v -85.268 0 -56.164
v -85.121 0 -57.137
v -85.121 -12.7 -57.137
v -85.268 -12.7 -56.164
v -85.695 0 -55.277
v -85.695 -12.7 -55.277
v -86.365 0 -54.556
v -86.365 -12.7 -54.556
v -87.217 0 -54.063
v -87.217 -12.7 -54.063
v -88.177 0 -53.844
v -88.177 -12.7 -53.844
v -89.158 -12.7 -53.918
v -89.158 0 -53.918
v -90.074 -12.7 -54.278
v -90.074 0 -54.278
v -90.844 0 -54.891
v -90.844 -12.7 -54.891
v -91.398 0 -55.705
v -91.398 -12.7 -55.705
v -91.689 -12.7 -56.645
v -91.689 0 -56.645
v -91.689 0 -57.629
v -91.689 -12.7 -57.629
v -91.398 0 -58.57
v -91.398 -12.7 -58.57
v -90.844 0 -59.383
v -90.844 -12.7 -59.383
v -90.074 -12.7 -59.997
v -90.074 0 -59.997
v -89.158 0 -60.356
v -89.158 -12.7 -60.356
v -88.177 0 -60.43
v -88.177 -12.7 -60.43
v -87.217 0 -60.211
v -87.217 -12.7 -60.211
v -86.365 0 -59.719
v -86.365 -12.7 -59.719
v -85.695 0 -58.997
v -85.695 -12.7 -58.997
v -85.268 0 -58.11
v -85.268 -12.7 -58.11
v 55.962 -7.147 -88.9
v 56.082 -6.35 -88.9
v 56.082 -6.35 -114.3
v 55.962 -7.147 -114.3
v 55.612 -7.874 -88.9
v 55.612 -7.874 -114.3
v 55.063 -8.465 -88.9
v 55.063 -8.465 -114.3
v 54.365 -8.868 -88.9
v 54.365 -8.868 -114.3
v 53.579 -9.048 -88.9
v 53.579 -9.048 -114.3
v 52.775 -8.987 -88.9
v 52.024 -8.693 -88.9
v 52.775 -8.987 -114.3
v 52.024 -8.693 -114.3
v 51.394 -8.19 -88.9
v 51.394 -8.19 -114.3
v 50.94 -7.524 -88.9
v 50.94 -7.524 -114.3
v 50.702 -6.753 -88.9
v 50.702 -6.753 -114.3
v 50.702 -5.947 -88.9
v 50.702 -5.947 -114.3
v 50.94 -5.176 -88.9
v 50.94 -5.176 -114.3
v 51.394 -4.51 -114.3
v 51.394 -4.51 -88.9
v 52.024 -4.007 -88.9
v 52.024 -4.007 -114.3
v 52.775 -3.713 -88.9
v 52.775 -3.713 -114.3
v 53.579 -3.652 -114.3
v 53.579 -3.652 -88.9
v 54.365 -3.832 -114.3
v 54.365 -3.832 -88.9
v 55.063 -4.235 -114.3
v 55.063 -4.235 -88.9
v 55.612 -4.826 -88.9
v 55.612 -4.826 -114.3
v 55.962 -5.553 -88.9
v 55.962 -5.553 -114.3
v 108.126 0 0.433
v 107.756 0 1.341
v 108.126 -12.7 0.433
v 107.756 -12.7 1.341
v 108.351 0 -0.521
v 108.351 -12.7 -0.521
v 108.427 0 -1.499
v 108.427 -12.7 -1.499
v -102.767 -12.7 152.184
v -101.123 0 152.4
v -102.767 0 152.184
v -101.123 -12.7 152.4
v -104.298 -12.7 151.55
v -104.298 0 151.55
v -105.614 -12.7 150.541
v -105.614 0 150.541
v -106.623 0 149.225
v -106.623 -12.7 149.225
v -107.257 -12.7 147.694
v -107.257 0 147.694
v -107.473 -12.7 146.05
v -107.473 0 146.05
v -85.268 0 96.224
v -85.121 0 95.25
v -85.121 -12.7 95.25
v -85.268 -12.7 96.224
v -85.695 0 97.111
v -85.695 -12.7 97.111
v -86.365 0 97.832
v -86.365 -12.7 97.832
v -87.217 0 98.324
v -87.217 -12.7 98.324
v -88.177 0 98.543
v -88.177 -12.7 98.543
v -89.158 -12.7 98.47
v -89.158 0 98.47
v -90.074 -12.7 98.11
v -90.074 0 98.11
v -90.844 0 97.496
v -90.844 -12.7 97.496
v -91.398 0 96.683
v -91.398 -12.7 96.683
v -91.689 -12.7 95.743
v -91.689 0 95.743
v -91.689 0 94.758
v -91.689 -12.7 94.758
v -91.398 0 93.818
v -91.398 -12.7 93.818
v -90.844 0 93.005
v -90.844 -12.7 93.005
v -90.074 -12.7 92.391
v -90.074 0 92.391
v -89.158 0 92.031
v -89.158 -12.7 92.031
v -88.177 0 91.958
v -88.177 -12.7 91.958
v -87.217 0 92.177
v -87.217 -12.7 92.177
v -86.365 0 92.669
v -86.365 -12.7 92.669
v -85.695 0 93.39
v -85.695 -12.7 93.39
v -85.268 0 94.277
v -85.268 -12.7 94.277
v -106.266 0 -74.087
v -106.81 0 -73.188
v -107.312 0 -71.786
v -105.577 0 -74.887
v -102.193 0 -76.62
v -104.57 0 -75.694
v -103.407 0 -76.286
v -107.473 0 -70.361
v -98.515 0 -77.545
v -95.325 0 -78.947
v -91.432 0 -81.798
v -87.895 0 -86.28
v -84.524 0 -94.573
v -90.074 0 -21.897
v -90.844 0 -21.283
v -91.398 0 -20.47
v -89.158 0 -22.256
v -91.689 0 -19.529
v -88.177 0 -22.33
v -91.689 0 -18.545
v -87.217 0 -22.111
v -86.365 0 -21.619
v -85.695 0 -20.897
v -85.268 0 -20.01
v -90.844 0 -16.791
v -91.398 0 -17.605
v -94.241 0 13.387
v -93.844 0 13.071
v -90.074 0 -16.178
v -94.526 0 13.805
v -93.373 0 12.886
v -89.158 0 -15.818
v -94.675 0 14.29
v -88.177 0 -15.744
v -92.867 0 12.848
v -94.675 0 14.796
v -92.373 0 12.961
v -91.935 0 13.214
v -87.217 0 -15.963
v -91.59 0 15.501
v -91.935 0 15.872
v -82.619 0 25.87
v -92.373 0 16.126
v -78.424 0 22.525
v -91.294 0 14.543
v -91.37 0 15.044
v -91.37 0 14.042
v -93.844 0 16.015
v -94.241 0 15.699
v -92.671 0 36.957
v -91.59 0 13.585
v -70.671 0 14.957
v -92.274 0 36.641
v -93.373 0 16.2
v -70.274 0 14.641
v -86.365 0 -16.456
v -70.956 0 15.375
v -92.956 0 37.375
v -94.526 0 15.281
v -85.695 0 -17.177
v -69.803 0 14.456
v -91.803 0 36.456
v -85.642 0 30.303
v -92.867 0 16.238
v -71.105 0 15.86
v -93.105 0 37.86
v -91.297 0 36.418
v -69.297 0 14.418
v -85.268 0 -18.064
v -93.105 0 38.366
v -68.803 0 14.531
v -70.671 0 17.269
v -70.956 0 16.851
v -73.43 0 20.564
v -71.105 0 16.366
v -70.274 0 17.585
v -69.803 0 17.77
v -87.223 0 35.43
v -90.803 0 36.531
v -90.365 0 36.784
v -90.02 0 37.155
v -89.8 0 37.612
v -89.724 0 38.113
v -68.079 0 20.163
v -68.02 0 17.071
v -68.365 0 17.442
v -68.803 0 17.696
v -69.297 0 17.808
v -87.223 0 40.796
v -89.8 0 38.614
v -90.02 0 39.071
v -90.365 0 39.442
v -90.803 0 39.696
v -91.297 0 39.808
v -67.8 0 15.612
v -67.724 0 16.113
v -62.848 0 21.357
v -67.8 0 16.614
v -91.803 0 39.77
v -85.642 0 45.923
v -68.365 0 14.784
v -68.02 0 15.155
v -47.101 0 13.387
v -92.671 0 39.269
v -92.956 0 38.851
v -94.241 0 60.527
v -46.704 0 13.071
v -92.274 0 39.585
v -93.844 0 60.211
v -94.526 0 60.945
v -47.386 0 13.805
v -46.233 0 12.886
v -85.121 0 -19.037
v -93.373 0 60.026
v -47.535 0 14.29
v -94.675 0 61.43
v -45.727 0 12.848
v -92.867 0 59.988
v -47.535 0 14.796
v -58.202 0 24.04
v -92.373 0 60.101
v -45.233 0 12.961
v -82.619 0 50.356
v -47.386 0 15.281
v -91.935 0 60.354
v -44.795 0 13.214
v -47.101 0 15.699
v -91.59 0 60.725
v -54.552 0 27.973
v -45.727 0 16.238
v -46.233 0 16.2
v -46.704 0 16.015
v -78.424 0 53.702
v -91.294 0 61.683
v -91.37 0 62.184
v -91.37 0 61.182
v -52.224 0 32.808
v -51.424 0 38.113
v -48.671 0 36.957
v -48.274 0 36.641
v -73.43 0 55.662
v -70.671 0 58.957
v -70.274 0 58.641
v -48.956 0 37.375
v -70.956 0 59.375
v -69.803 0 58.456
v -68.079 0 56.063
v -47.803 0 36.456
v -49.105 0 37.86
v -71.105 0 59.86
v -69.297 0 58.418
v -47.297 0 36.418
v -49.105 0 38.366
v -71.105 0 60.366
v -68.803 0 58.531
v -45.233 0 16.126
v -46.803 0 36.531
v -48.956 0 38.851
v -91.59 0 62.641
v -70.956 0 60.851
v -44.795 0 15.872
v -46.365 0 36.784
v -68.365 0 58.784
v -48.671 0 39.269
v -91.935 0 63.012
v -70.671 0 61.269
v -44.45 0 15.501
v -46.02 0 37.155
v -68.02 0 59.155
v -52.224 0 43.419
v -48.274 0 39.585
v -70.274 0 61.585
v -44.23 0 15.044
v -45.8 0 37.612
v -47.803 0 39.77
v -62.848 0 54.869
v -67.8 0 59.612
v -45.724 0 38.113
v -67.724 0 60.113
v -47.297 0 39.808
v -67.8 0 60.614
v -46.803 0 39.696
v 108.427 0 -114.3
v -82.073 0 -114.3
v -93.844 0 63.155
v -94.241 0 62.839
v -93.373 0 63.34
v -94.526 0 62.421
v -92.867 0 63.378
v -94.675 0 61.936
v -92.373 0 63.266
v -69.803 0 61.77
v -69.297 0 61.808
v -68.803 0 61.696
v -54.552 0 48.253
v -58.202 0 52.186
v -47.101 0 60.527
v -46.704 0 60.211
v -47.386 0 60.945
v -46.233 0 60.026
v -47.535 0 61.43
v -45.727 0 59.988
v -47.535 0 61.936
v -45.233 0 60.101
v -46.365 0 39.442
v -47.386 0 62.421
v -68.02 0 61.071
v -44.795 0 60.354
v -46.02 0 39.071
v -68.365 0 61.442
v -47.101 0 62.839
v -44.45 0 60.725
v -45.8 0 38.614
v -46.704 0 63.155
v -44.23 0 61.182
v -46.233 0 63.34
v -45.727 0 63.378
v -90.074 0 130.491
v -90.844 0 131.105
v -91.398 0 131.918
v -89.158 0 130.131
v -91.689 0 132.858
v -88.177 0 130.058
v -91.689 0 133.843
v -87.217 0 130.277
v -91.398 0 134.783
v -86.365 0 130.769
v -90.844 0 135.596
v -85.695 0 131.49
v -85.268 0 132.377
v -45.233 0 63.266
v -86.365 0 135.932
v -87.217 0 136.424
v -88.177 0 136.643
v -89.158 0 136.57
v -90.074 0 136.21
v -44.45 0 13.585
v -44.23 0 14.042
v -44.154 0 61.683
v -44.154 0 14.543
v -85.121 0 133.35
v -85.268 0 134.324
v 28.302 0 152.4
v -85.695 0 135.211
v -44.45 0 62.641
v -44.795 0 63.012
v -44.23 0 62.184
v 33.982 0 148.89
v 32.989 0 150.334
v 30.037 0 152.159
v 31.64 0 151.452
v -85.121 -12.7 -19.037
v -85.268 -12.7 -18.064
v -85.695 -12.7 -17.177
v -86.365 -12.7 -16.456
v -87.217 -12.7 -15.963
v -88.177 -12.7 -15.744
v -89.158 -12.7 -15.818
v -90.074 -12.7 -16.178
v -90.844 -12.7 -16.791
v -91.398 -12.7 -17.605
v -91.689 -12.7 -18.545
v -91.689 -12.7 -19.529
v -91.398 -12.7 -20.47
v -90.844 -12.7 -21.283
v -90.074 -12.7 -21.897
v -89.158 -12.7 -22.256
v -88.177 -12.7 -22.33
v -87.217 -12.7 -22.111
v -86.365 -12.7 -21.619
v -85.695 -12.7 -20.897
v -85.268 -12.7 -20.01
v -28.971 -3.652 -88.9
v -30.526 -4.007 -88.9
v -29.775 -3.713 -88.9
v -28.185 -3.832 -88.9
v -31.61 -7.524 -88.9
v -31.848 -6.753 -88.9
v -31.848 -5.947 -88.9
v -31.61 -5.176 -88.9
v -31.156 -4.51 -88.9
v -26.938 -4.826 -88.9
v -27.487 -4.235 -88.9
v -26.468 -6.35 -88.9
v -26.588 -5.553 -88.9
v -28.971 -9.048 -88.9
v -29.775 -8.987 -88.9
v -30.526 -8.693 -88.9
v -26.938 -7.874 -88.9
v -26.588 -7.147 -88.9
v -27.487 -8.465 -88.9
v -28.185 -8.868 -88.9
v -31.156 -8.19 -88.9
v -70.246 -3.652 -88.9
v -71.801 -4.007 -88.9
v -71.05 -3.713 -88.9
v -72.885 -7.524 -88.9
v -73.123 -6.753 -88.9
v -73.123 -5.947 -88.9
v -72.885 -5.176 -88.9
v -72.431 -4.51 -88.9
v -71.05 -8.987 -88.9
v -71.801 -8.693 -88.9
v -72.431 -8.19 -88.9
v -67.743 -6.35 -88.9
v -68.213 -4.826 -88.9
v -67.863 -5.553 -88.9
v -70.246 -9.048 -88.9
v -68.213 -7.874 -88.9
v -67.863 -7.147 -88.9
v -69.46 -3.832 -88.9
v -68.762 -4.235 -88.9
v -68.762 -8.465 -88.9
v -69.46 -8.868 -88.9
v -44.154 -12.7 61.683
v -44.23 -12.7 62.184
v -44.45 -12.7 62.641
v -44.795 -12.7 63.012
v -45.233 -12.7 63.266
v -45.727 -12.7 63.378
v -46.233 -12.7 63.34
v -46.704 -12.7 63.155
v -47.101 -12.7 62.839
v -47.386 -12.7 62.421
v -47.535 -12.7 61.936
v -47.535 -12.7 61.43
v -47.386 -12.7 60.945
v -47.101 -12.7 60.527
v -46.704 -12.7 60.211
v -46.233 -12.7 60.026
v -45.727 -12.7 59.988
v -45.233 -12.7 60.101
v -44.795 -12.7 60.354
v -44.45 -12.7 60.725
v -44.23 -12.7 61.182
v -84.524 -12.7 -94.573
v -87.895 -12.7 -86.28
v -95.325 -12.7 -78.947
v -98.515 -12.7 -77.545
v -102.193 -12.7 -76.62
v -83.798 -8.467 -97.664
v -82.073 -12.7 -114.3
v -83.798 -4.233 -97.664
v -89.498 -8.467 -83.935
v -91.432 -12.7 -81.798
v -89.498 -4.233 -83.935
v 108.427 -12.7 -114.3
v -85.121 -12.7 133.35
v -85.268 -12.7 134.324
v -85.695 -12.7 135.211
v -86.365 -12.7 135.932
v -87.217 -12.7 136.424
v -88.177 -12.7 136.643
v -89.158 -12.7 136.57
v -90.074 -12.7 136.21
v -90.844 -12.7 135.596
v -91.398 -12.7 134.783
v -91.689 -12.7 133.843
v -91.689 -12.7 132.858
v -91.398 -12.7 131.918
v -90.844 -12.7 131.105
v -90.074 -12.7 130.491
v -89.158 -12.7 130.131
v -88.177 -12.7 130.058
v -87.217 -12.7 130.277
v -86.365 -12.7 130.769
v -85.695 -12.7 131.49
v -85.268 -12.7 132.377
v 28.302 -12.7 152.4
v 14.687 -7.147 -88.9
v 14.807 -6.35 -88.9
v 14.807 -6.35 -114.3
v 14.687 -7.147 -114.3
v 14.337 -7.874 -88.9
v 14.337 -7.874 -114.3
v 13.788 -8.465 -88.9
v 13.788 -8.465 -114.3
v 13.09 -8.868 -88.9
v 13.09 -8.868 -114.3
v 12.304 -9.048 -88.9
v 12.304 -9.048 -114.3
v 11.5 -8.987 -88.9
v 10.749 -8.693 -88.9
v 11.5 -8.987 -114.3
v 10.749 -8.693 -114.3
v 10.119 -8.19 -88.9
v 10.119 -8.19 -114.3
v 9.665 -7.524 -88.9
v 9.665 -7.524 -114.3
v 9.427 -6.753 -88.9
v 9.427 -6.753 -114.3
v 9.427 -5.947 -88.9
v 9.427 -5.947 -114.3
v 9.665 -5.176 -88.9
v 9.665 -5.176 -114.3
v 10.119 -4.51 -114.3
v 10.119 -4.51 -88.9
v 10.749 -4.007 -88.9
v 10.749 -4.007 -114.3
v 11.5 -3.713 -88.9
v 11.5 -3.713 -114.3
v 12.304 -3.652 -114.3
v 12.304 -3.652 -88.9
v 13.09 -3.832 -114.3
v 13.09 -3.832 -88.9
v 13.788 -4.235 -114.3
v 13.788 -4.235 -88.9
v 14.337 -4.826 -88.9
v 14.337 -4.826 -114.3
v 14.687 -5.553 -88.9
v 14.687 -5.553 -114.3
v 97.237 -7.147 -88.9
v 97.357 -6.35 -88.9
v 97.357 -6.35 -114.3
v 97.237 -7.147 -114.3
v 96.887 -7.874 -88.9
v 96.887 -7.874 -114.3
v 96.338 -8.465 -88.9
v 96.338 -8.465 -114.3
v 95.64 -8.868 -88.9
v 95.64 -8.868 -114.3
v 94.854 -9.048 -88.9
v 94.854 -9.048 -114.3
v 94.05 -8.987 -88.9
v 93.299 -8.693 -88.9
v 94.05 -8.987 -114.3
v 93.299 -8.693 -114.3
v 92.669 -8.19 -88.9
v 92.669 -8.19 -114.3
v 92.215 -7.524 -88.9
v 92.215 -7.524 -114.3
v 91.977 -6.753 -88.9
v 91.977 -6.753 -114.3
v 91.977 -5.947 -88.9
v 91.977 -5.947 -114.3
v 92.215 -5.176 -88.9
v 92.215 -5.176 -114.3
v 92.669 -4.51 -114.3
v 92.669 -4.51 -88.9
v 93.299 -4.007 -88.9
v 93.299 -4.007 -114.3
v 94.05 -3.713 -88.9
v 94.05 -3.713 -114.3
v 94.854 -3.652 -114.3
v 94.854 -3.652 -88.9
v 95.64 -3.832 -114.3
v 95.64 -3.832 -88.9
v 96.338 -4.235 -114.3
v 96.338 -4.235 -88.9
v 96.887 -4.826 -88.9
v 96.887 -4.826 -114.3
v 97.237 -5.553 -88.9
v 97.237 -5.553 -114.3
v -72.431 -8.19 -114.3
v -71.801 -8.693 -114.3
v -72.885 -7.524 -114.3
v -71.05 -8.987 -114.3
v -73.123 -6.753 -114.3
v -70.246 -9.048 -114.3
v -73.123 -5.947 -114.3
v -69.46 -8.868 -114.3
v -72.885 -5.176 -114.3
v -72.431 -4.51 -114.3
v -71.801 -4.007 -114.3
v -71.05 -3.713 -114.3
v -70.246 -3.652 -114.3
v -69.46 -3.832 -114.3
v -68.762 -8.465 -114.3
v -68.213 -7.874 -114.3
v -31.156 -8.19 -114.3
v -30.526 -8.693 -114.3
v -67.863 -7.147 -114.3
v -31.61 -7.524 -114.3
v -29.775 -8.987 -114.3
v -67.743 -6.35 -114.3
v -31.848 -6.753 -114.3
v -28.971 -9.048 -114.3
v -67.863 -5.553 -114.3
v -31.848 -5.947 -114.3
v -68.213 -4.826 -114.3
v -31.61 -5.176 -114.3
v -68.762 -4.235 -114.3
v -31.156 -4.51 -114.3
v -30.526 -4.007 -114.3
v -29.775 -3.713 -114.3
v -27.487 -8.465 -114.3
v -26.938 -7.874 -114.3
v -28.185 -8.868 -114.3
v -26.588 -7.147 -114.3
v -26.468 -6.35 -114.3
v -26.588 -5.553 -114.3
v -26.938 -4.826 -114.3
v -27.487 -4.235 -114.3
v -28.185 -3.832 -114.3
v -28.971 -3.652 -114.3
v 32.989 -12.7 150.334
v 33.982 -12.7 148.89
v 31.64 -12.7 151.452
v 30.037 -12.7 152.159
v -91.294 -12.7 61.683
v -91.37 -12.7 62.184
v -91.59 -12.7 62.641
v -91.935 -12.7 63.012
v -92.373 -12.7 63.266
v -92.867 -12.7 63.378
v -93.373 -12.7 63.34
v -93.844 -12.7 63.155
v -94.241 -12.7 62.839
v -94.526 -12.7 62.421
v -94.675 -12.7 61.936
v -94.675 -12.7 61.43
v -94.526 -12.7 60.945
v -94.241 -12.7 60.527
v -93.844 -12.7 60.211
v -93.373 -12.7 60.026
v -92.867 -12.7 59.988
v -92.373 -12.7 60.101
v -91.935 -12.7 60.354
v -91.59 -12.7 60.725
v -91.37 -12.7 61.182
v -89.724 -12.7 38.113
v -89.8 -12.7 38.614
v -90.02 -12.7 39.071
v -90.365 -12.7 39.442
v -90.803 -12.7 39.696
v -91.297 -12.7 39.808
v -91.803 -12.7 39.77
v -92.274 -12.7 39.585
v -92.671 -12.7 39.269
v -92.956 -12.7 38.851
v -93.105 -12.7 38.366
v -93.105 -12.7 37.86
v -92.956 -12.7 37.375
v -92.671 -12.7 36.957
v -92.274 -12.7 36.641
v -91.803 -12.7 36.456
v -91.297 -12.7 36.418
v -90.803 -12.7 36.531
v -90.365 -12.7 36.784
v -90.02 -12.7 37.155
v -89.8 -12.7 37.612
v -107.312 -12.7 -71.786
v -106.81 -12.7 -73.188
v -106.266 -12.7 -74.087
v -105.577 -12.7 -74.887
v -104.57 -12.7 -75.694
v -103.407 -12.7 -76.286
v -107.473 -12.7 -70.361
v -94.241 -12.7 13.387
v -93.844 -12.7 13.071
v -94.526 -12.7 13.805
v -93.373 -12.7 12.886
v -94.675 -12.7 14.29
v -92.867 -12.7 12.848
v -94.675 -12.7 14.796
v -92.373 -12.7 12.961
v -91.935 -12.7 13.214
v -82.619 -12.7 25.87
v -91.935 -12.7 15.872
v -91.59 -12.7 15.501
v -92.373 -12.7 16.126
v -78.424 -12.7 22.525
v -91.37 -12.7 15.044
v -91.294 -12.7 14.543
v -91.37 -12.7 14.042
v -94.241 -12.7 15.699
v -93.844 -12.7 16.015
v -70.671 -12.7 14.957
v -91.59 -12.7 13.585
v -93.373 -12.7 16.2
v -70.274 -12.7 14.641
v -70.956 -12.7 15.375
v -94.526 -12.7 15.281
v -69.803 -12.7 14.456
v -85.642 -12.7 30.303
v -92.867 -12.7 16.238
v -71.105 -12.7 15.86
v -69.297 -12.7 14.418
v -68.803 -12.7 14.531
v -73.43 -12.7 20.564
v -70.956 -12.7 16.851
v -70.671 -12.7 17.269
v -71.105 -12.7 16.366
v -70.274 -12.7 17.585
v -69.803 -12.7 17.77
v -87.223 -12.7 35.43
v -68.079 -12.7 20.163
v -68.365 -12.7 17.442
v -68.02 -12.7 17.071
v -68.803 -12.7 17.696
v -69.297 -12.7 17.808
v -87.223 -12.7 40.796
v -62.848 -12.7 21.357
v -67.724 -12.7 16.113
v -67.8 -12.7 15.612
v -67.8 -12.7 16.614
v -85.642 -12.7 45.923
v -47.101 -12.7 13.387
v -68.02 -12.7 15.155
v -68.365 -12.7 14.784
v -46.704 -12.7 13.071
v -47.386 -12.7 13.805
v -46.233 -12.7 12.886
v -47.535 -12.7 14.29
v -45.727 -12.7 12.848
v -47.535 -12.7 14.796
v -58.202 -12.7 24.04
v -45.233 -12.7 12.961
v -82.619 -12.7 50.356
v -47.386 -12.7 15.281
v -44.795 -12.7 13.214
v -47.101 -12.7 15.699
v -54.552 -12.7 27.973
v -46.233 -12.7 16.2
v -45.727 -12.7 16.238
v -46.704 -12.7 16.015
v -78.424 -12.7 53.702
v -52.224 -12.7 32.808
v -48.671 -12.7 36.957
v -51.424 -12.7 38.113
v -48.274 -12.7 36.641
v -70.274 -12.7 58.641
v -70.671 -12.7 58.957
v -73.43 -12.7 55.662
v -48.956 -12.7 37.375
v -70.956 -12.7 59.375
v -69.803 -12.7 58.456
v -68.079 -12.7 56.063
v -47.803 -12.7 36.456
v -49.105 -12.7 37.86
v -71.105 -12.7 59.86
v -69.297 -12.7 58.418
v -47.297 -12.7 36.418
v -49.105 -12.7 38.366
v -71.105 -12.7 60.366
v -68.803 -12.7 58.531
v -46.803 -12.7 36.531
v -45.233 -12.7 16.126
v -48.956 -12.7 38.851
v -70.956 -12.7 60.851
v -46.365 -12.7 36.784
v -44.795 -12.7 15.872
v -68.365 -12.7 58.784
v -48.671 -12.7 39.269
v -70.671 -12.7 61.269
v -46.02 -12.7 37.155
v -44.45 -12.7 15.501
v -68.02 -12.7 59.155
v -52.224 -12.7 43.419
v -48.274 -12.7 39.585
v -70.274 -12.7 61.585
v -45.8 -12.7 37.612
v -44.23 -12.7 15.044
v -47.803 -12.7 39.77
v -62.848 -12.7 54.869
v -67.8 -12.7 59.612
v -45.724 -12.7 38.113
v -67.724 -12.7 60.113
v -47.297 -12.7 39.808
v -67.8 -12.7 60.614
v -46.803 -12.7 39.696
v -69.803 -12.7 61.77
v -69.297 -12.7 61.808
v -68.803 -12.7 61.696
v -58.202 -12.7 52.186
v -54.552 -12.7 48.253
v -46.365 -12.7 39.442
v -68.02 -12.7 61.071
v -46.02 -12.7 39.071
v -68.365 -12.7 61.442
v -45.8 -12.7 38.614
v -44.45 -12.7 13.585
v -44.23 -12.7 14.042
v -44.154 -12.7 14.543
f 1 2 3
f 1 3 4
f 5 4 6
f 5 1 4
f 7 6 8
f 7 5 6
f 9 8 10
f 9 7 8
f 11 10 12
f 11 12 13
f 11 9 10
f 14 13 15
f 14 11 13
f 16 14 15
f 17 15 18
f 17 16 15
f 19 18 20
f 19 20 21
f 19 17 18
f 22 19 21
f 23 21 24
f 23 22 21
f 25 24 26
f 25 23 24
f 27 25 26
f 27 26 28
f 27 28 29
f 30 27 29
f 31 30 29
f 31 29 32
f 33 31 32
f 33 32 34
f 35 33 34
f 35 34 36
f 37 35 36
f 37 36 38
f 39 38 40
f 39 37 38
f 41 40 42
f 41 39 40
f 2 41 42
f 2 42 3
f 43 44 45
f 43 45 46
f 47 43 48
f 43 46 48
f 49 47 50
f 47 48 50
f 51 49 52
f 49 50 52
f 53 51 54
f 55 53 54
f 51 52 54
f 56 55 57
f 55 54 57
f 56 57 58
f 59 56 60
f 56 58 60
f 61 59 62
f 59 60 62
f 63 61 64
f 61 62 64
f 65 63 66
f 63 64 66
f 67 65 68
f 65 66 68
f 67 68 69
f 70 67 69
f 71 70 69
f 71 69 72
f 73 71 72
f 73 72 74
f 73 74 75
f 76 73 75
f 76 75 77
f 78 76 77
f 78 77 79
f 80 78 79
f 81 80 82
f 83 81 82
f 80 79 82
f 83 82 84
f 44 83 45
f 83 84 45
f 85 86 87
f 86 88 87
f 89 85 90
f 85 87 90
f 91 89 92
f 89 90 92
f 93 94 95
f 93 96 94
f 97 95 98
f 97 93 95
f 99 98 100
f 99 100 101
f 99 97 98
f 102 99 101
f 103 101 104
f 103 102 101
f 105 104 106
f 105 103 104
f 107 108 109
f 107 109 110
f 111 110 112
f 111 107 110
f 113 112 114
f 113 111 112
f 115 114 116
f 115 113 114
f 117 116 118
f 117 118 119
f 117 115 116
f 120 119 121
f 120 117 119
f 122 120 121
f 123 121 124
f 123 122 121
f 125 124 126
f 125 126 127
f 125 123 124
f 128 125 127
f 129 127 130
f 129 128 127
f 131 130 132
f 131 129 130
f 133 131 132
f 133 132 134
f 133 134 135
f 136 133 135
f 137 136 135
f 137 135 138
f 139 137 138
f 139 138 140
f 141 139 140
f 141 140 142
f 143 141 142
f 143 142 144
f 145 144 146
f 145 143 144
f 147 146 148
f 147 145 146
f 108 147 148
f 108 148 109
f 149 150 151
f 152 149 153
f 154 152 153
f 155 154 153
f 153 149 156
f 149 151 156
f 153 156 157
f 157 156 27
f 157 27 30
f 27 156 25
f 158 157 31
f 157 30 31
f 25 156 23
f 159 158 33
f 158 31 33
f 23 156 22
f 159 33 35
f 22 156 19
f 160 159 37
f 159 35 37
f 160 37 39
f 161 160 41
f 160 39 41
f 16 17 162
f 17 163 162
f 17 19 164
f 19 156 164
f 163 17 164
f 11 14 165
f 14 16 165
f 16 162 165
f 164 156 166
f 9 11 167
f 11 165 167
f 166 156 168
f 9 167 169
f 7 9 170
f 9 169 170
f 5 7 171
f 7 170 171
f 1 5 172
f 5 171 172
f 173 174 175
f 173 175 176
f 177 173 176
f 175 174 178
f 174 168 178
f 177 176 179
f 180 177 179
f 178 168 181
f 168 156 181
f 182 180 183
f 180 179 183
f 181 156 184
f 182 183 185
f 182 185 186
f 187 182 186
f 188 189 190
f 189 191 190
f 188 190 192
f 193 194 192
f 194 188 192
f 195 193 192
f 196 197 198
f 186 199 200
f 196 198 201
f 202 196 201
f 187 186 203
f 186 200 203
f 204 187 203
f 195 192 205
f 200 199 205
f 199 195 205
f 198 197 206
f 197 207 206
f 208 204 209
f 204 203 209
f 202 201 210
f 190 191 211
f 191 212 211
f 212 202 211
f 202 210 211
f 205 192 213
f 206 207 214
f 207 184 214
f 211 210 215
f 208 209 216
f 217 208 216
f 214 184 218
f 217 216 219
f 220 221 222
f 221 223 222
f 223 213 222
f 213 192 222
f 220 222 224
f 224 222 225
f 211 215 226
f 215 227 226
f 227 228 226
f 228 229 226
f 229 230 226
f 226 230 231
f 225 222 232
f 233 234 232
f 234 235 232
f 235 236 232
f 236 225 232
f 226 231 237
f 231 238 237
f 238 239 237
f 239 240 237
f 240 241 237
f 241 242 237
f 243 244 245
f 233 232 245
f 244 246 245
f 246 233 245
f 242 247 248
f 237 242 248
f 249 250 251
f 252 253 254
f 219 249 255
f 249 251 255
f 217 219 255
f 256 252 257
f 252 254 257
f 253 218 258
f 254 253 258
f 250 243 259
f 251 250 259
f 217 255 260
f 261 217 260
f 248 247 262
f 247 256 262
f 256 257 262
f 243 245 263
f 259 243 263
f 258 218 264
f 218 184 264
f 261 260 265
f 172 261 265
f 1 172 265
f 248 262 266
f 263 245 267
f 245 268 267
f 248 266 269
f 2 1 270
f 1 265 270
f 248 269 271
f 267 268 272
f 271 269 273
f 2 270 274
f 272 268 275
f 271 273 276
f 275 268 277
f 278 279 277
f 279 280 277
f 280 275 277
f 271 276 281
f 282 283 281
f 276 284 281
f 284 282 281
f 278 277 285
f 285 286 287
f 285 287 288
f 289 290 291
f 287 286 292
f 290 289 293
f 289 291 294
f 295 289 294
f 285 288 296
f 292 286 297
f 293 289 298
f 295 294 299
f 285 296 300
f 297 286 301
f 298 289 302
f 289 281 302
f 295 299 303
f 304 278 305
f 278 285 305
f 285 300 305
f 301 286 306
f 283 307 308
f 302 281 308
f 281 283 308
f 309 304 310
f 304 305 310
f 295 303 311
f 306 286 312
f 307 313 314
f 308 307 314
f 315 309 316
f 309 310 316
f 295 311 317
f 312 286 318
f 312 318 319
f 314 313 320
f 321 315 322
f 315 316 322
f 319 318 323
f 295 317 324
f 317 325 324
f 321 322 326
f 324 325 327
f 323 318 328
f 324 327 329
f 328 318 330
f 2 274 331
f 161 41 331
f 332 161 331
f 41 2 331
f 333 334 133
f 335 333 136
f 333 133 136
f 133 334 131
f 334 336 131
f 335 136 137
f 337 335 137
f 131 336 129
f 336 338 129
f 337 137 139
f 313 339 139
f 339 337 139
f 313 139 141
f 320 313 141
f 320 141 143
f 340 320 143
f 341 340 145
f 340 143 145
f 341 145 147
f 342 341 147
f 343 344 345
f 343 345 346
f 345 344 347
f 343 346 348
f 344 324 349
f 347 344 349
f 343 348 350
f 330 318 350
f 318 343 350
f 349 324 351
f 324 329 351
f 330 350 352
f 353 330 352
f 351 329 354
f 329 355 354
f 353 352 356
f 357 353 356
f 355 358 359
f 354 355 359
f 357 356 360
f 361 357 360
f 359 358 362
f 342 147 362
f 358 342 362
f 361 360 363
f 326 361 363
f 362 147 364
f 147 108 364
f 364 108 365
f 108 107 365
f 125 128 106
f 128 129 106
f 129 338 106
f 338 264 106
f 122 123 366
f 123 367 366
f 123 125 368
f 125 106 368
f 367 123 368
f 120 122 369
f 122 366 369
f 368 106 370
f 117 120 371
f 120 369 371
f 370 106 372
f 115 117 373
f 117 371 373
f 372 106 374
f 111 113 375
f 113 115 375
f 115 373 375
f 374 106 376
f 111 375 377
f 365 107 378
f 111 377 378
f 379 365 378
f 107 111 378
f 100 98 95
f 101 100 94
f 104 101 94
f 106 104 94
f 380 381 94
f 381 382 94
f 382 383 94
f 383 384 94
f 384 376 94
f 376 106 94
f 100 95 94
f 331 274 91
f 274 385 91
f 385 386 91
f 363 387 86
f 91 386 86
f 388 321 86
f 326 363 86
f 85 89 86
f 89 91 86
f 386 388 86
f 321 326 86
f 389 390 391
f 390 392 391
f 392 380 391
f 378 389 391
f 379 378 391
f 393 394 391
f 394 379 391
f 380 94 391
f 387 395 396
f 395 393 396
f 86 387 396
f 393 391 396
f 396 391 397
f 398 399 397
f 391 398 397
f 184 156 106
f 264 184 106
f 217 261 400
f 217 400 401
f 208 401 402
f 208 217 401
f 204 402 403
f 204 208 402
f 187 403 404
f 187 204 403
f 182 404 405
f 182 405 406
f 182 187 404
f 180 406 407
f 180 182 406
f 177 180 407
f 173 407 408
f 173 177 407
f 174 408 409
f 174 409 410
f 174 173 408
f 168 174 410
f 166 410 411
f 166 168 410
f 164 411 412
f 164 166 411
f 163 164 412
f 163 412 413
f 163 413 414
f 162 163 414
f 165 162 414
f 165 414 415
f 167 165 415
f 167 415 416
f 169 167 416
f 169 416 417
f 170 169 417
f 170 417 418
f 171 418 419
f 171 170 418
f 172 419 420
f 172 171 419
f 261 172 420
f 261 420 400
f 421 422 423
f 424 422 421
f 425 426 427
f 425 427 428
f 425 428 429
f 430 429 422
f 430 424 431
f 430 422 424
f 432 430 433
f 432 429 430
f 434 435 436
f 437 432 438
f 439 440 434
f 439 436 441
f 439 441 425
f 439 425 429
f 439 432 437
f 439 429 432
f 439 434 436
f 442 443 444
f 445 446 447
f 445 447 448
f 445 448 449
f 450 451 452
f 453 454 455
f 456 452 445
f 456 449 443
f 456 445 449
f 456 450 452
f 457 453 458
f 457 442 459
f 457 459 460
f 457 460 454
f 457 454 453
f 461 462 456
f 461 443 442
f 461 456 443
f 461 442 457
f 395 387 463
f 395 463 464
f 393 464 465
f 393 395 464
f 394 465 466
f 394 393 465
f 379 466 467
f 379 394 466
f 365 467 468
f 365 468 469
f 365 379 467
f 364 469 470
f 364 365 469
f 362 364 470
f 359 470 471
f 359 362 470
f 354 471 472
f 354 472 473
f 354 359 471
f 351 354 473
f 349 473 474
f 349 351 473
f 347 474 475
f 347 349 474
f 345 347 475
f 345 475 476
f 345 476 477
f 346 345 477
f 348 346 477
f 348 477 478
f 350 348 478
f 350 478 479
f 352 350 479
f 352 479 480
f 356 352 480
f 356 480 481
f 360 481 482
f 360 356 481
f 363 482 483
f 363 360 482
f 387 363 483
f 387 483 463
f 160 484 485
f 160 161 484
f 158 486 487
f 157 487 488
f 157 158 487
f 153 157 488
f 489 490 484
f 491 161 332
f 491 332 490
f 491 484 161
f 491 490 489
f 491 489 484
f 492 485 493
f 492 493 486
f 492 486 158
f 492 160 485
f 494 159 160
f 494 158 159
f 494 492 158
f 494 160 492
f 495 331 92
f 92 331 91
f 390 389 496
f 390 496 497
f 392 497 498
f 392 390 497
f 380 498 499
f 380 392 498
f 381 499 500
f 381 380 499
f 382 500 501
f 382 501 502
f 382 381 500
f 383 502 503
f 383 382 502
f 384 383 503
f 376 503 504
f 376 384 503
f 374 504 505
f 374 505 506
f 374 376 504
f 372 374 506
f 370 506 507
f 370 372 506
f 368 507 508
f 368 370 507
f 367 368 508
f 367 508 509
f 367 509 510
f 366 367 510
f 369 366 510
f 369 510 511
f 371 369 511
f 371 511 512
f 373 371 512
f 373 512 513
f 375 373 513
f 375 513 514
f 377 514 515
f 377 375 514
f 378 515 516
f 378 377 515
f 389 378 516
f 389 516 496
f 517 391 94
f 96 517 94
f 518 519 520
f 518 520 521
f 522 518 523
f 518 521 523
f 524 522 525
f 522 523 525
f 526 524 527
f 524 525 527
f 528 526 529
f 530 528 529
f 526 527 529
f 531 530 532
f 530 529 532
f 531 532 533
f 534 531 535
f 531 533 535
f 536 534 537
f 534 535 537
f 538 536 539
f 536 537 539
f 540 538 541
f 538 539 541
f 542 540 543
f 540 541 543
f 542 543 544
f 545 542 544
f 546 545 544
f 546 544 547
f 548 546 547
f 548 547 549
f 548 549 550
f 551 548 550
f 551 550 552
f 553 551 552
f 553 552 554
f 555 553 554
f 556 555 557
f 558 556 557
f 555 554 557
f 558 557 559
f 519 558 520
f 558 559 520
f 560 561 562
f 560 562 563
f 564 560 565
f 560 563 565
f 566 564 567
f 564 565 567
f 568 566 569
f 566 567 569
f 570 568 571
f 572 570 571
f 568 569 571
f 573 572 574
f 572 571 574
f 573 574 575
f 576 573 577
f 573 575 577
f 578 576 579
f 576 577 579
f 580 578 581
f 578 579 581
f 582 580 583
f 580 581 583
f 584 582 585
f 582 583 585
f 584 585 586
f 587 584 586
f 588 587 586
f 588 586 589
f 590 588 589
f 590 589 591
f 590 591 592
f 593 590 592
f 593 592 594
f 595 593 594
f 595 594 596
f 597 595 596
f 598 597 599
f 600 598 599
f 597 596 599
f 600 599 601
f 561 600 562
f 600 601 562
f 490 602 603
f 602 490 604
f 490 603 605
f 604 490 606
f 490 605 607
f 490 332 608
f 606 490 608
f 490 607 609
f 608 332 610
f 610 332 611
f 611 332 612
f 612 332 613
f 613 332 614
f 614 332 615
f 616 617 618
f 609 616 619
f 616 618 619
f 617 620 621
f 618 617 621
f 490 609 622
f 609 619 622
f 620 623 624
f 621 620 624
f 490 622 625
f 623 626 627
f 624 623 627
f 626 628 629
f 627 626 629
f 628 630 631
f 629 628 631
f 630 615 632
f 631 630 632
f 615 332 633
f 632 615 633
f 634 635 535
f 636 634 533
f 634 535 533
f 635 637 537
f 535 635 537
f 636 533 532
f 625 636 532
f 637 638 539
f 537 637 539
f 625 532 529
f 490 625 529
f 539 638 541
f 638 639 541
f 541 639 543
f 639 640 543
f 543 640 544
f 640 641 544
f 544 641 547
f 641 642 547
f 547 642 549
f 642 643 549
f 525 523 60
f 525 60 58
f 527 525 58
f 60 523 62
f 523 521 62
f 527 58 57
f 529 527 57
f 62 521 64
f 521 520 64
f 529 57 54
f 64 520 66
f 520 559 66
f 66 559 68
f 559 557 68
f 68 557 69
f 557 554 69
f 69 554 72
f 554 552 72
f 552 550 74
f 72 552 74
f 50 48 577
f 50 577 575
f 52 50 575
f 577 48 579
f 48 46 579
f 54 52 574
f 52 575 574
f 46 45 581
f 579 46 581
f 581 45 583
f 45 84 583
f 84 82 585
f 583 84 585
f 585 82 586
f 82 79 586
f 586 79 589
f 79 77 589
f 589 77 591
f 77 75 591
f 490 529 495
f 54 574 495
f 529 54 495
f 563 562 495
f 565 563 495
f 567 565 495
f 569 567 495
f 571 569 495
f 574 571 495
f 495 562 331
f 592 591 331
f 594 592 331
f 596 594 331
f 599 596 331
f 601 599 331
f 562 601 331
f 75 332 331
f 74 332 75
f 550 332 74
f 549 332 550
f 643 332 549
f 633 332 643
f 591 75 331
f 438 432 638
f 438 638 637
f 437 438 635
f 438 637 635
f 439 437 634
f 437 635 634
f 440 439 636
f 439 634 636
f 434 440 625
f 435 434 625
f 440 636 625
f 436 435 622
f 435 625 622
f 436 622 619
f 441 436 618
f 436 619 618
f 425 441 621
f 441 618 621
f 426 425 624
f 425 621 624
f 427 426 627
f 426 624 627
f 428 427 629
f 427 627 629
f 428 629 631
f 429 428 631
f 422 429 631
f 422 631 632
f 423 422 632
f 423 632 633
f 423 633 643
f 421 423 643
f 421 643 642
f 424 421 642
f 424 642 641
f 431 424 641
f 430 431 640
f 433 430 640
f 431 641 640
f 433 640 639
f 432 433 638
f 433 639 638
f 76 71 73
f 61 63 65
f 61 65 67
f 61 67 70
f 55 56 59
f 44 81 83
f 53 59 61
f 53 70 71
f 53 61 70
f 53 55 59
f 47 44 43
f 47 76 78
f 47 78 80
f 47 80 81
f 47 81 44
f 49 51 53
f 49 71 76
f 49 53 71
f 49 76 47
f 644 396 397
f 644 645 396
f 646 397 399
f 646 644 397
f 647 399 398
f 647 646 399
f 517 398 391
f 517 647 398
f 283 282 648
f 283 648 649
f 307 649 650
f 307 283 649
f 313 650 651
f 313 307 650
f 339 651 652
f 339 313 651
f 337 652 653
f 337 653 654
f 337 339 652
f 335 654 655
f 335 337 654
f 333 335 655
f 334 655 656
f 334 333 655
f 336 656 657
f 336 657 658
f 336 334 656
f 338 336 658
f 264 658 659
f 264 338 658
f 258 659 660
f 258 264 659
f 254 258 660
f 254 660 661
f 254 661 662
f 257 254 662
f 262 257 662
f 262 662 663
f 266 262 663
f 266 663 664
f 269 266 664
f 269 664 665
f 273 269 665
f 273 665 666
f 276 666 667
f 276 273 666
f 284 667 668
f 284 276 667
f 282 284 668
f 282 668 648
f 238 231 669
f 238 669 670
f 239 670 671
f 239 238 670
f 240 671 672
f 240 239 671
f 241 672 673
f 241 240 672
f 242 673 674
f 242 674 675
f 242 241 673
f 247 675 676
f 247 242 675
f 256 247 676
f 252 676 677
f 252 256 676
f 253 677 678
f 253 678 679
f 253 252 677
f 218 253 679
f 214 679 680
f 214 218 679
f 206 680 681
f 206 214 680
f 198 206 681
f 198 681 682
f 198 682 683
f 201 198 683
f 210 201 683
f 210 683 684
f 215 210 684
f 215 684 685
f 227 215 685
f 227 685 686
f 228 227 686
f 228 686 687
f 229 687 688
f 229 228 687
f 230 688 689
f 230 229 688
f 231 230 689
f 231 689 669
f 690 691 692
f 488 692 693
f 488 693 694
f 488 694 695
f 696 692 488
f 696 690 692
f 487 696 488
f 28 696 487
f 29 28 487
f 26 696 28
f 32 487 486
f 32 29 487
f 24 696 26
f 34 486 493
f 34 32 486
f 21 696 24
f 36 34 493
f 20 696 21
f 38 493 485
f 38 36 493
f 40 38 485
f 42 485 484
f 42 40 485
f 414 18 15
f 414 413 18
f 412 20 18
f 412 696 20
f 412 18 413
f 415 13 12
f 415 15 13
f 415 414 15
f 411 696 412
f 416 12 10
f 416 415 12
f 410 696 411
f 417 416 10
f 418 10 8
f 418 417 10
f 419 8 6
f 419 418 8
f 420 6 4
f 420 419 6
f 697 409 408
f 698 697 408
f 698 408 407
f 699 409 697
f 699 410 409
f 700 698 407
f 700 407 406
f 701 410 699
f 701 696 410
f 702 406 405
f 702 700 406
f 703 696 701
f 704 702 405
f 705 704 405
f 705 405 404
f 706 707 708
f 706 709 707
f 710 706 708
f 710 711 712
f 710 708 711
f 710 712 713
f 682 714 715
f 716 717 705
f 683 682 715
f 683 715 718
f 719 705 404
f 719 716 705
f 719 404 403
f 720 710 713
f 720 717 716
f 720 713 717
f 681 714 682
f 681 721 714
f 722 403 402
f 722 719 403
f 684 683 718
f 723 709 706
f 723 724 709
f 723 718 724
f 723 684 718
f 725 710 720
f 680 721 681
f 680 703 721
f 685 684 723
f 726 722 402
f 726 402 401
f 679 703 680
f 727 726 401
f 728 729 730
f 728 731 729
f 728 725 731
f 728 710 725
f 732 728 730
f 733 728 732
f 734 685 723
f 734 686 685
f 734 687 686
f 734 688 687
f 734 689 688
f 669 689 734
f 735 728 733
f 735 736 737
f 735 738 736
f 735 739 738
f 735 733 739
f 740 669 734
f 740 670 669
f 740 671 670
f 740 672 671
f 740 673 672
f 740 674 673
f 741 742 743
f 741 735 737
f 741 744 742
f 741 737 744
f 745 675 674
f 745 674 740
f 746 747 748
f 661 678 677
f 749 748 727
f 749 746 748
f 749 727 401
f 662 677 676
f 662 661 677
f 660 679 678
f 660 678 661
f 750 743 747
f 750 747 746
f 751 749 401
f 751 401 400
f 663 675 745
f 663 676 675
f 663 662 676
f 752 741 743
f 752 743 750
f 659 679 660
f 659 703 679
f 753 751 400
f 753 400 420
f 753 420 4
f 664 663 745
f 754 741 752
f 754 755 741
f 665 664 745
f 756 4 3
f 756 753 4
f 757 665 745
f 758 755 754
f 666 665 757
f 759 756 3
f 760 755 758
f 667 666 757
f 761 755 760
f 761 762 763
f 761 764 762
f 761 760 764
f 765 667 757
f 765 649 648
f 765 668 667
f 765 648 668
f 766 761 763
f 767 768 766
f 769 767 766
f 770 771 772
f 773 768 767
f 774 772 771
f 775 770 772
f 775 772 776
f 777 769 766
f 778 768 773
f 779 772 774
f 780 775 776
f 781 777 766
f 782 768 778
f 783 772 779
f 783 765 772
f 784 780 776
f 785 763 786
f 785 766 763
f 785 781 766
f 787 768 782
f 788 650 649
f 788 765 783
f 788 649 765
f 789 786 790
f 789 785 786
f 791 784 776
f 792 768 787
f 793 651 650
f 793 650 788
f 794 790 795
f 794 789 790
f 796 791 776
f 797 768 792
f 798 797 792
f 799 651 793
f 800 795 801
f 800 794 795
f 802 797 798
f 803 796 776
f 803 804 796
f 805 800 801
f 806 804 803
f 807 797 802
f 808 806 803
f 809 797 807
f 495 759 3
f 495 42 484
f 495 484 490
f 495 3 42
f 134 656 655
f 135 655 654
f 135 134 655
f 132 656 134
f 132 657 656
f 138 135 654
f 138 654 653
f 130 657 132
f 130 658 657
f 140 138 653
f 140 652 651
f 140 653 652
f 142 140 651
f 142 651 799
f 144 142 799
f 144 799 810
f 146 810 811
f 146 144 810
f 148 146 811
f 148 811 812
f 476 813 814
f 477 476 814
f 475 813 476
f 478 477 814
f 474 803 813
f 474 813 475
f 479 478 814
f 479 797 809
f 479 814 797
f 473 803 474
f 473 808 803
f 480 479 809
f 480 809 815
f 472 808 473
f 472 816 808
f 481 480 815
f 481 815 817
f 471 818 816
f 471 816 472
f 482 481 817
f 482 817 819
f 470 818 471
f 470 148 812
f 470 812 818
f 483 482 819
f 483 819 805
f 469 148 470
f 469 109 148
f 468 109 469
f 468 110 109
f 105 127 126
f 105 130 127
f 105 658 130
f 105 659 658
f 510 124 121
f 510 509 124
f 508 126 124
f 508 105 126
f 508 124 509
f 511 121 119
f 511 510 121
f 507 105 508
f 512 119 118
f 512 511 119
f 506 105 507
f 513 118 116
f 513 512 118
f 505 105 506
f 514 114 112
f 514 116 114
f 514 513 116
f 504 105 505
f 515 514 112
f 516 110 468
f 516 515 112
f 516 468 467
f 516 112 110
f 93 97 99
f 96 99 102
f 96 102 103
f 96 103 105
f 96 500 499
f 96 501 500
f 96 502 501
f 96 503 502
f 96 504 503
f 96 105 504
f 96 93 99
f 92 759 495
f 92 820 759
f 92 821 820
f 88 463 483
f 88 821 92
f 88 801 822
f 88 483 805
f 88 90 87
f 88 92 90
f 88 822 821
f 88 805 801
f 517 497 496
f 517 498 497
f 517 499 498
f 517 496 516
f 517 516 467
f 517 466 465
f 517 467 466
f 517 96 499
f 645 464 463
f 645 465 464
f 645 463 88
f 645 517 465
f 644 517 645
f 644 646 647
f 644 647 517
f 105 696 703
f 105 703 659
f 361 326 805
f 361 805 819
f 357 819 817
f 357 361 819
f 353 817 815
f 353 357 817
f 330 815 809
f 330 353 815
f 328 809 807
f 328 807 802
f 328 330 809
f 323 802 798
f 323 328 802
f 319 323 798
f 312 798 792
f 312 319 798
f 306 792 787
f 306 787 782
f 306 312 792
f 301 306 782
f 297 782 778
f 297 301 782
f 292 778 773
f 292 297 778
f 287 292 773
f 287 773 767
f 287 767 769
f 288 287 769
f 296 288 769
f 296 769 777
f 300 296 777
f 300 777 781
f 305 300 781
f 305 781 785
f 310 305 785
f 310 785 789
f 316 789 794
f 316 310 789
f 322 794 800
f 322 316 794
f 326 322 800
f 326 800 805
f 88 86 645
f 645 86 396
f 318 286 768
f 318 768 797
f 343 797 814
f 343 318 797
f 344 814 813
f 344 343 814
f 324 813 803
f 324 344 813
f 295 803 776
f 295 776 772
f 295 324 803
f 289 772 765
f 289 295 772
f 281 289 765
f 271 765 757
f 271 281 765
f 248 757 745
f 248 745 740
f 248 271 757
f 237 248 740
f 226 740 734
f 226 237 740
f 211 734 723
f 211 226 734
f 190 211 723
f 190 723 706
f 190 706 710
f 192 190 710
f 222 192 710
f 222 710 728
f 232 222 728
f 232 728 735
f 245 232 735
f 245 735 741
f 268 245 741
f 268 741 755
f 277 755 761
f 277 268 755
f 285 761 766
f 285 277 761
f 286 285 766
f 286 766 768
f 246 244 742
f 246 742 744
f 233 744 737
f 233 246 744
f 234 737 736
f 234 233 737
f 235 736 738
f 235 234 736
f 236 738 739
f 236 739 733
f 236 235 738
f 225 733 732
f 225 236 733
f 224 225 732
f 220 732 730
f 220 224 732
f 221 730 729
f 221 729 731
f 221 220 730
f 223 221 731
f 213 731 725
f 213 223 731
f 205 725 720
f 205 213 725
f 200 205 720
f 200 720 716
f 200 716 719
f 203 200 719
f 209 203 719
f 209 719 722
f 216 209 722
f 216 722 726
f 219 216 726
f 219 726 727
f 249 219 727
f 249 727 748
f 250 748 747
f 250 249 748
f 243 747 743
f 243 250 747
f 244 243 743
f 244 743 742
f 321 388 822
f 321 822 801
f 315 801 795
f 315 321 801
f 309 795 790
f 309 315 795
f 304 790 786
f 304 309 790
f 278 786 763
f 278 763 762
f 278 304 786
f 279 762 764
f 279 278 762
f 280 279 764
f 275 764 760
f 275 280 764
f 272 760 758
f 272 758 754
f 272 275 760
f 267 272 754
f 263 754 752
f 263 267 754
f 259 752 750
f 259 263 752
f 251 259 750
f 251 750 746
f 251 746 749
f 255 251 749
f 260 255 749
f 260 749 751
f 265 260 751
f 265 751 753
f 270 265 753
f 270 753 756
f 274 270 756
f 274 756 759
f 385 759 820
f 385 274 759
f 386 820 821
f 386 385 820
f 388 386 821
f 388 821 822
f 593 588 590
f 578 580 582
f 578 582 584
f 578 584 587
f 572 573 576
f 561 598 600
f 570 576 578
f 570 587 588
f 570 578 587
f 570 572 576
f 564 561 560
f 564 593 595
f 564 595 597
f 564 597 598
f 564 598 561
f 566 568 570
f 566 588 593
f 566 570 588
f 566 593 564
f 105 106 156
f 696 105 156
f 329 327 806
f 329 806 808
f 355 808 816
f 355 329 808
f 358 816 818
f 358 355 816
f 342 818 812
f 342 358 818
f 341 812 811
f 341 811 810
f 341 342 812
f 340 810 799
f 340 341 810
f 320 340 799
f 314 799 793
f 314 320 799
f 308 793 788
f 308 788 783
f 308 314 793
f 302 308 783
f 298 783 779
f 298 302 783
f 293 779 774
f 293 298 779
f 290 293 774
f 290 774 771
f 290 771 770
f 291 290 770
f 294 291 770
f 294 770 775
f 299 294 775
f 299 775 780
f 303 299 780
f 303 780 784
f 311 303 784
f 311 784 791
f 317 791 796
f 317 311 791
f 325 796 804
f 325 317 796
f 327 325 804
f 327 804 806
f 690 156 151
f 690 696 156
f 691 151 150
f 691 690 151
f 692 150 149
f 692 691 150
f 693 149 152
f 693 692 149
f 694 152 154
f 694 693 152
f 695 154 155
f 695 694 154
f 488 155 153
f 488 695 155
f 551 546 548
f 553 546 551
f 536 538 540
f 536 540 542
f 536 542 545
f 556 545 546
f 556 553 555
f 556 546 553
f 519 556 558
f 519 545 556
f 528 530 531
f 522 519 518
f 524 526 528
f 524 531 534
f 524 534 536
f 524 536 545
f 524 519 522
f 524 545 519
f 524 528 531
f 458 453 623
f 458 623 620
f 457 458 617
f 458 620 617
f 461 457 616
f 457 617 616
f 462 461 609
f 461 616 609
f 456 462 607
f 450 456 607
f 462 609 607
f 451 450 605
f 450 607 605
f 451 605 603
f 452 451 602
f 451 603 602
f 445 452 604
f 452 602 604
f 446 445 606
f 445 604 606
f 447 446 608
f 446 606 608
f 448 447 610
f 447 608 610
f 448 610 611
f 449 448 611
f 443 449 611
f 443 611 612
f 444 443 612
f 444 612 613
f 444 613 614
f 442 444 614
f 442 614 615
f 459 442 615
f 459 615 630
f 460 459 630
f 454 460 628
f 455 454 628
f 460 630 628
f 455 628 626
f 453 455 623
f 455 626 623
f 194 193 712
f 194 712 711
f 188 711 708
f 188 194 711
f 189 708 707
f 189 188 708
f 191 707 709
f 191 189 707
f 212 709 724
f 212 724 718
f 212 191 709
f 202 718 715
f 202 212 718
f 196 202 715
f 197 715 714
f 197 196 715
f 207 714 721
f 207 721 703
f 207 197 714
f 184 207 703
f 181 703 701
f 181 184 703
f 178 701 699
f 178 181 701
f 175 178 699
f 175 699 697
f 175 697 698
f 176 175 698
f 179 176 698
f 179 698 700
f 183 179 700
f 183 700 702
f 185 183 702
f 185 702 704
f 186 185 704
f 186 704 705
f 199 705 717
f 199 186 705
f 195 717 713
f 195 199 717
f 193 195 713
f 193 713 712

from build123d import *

# Parameters (mm, degrees)
F0_R     = 3.302
F0_R_2   = 1.7
F0_R_3   = 18
F1_DEPTH = 12.7
F2_DEPTH = 25.4
F3_R     = 6.35
F4_R     = 2.7051
F5_DEPTH = 25.4


# Not quite as in the source:
# - a feature names something its author has since deleted; it is built from what else it names


with BuildPart() as f1:
    # F0 (on Front) → F1 (new body)
    with BuildSketch(Plane.XZ):
        with BuildLine():
            Line((108.4265169831, 0.0004552842), (32.2265169831, 152.4004552842))
            Line((32.2265169831, 152.4004552842), (-107.4734830169, 152.4004552842))
            Line((-107.4734830169, 152.4004552842), (-107.4734830169, -76.1995447158))
            add(Edge.make_bspline(
                [(-82.0734830169, -114.2995447158), (-82.8863746009, -95.7832909802), (-85.4194185281, -76.1871889735), (-107.4734830169, -76.1995447158)],
                knots=[0, 0, 0, 0, 45.7905011984, 45.7905011984, 45.7905011984, 45.7905011984], degree=3))
            Line((-82.0734830169, -114.2995447158), (108.4265169831, -114.2995447158))
            Line((108.4265169831, -114.2995447158), (108.4265169831, 0.0004552842))
        make_face()
        with Locations((-88.4234830169, -57.1371889735)):
            Circle(F0_R, mode=Mode.SUBTRACT)
        with Locations((-88.4234830169, -19.0371889735)):
            Circle(F0_R, mode=Mode.SUBTRACT)
        with Locations((-92.9944827628, 14.5430932346)):
            Circle(F0_R_2, mode=Mode.SUBTRACT)
        with Locations((-69.4244827628, 16.1130932346)):
            Circle(F0_R_2, mode=Mode.SUBTRACT)
        with Locations((-45.8544827628, 14.5430932346)):
            Circle(F0_R_2, mode=Mode.SUBTRACT)
        with Locations((-91.4244827628, 38.1130932346)):
            Circle(F0_R_2, mode=Mode.SUBTRACT)
        with Locations((-69.4244827628, 38.1130932346)):
            Circle(F0_R_3, mode=Mode.SUBTRACT)
        with Locations((-92.9944827628, 61.6830932346)):
            Circle(F0_R_2, mode=Mode.SUBTRACT)
        with Locations((-69.4244827628, 60.1130932346)):
            Circle(F0_R_2, mode=Mode.SUBTRACT)
        with Locations((-47.4244827628, 38.1130932346)):
            Circle(F0_R_2, mode=Mode.SUBTRACT)
        with Locations((-45.8544827628, 61.6830932346)):
            Circle(F0_R_2, mode=Mode.SUBTRACT)
        with Locations((-88.4234830169, 95.2504552842)):
            Circle(F0_R, mode=Mode.SUBTRACT)
        with Locations((-88.4234830169, 133.3504552842)):
            Circle(F0_R, mode=Mode.SUBTRACT)
    extrude(amount=F1_DEPTH)

    # F0 (on Front) → F2 (cut)
    with BuildSketch(Plane.XZ):
        with BuildLine():
            add(Edge.make_bspline(
                [(-82.0734830169, -114.2995447158), (-82.8863746009, -95.7832909802), (-85.4194185281, -76.1871889735), (-107.4734830169, -76.1995447158)],
                knots=[0, 0, 0, 0, 45.7905011984, 45.7905011984, 45.7905011984, 45.7905011984], degree=3))
            Line((-107.4734830169, -76.1995447158), (-107.4734830169, -114.2995447158))
            Line((-107.4734830169, -114.2995447158), (-82.0734830169, -114.2995447158))
        make_face()
        with BuildLine():
            Line((108.4265169831, 0.0004552842), (32.2265169831, 152.4004552842))
            Line((32.2265169831, 152.4004552842), (-107.4734830169, 152.4004552842))
            Line((-107.4734830169, 152.4004552842), (-107.4734830169, -76.1995447158))
            add(Edge.make_bspline(
                [(-82.0734830169, -114.2995447158), (-82.8863746009, -95.7832909802), (-85.4194185281, -76.1871889735), (-107.4734830169, -76.1995447158)],
                knots=[0, 0, 0, 0, 45.7905011984, 45.7905011984, 45.7905011984, 45.7905011984], degree=3))
            Line((-82.0734830169, -114.2995447158), (108.4265169831, -114.2995447158))
            Line((108.4265169831, -114.2995447158), (108.4265169831, 0.0004552842))
        make_face()
        with Locations((-88.4234830169, -57.1371889735)):
            Circle(F0_R, mode=Mode.SUBTRACT)
        with Locations((-88.4234830169, -19.0371889735)):
            Circle(F0_R, mode=Mode.SUBTRACT)
        with Locations((-92.9944827628, 14.5430932346)):
            Circle(F0_R_2, mode=Mode.SUBTRACT)
        with Locations((-69.4244827628, 16.1130932346)):
            Circle(F0_R_2, mode=Mode.SUBTRACT)
        with Locations((-45.8544827628, 14.5430932346)):
            Circle(F0_R_2, mode=Mode.SUBTRACT)
        with Locations((-91.4244827628, 38.1130932346)):
            Circle(F0_R_2, mode=Mode.SUBTRACT)
        with Locations((-69.4244827628, 38.1130932346)):
            Circle(F0_R_3, mode=Mode.SUBTRACT)
        with Locations((-92.9944827628, 61.6830932346)):
            Circle(F0_R_2, mode=Mode.SUBTRACT)
        with Locations((-69.4244827628, 60.1130932346)):
            Circle(F0_R_2, mode=Mode.SUBTRACT)
        with Locations((-47.4244827628, 38.1130932346)):
            Circle(F0_R_2, mode=Mode.SUBTRACT)
        with Locations((-45.8544827628, 61.6830932346)):
            Circle(F0_R_2, mode=Mode.SUBTRACT)
        with Locations((-88.4234830169, 95.2504552842)):
            Circle(F0_R, mode=Mode.SUBTRACT)
        with Locations((-88.4234830169, 133.3504552842)):
            Circle(F0_R, mode=Mode.SUBTRACT)
    extrude(amount=-F2_DEPTH, mode=Mode.SUBTRACT)

    # F3
    f3_edges = [f1.edges().sort_by_distance(p)[0] for p in [
        (-107.473483, -6.35, -76.199545),
        (-107.473483, -6.35, 152.400455),
        (108.426517, -6.35, 0.000455),
        (32.226517, -6.35, 152.400455),
    ]]
    fillet(f3_edges, radius=F3_R)

    # F4 (on face) → F5 (cut)
    with BuildSketch(Plane(origin=(0, 0, -114.2995447158), x_dir=(1, 0, 0), z_dir=(0, 0, -1))):
        with Locations((-70.4482253863, 6.35)):
            Circle(F4_R)
        with Locations((-29.1732253863, 6.35)):
            Circle(F4_R)
        with Locations((12.1017746137, 6.35)):
            Circle(F4_R)
        with Locations((53.3767746137, 6.35)):
            Circle(F4_R)
        with Locations((94.6517746137, 6.35)):
            Circle(F4_R)
    extrude(amount=-F5_DEPTH, mode=Mode.SUBTRACT)


solid = f1.part
